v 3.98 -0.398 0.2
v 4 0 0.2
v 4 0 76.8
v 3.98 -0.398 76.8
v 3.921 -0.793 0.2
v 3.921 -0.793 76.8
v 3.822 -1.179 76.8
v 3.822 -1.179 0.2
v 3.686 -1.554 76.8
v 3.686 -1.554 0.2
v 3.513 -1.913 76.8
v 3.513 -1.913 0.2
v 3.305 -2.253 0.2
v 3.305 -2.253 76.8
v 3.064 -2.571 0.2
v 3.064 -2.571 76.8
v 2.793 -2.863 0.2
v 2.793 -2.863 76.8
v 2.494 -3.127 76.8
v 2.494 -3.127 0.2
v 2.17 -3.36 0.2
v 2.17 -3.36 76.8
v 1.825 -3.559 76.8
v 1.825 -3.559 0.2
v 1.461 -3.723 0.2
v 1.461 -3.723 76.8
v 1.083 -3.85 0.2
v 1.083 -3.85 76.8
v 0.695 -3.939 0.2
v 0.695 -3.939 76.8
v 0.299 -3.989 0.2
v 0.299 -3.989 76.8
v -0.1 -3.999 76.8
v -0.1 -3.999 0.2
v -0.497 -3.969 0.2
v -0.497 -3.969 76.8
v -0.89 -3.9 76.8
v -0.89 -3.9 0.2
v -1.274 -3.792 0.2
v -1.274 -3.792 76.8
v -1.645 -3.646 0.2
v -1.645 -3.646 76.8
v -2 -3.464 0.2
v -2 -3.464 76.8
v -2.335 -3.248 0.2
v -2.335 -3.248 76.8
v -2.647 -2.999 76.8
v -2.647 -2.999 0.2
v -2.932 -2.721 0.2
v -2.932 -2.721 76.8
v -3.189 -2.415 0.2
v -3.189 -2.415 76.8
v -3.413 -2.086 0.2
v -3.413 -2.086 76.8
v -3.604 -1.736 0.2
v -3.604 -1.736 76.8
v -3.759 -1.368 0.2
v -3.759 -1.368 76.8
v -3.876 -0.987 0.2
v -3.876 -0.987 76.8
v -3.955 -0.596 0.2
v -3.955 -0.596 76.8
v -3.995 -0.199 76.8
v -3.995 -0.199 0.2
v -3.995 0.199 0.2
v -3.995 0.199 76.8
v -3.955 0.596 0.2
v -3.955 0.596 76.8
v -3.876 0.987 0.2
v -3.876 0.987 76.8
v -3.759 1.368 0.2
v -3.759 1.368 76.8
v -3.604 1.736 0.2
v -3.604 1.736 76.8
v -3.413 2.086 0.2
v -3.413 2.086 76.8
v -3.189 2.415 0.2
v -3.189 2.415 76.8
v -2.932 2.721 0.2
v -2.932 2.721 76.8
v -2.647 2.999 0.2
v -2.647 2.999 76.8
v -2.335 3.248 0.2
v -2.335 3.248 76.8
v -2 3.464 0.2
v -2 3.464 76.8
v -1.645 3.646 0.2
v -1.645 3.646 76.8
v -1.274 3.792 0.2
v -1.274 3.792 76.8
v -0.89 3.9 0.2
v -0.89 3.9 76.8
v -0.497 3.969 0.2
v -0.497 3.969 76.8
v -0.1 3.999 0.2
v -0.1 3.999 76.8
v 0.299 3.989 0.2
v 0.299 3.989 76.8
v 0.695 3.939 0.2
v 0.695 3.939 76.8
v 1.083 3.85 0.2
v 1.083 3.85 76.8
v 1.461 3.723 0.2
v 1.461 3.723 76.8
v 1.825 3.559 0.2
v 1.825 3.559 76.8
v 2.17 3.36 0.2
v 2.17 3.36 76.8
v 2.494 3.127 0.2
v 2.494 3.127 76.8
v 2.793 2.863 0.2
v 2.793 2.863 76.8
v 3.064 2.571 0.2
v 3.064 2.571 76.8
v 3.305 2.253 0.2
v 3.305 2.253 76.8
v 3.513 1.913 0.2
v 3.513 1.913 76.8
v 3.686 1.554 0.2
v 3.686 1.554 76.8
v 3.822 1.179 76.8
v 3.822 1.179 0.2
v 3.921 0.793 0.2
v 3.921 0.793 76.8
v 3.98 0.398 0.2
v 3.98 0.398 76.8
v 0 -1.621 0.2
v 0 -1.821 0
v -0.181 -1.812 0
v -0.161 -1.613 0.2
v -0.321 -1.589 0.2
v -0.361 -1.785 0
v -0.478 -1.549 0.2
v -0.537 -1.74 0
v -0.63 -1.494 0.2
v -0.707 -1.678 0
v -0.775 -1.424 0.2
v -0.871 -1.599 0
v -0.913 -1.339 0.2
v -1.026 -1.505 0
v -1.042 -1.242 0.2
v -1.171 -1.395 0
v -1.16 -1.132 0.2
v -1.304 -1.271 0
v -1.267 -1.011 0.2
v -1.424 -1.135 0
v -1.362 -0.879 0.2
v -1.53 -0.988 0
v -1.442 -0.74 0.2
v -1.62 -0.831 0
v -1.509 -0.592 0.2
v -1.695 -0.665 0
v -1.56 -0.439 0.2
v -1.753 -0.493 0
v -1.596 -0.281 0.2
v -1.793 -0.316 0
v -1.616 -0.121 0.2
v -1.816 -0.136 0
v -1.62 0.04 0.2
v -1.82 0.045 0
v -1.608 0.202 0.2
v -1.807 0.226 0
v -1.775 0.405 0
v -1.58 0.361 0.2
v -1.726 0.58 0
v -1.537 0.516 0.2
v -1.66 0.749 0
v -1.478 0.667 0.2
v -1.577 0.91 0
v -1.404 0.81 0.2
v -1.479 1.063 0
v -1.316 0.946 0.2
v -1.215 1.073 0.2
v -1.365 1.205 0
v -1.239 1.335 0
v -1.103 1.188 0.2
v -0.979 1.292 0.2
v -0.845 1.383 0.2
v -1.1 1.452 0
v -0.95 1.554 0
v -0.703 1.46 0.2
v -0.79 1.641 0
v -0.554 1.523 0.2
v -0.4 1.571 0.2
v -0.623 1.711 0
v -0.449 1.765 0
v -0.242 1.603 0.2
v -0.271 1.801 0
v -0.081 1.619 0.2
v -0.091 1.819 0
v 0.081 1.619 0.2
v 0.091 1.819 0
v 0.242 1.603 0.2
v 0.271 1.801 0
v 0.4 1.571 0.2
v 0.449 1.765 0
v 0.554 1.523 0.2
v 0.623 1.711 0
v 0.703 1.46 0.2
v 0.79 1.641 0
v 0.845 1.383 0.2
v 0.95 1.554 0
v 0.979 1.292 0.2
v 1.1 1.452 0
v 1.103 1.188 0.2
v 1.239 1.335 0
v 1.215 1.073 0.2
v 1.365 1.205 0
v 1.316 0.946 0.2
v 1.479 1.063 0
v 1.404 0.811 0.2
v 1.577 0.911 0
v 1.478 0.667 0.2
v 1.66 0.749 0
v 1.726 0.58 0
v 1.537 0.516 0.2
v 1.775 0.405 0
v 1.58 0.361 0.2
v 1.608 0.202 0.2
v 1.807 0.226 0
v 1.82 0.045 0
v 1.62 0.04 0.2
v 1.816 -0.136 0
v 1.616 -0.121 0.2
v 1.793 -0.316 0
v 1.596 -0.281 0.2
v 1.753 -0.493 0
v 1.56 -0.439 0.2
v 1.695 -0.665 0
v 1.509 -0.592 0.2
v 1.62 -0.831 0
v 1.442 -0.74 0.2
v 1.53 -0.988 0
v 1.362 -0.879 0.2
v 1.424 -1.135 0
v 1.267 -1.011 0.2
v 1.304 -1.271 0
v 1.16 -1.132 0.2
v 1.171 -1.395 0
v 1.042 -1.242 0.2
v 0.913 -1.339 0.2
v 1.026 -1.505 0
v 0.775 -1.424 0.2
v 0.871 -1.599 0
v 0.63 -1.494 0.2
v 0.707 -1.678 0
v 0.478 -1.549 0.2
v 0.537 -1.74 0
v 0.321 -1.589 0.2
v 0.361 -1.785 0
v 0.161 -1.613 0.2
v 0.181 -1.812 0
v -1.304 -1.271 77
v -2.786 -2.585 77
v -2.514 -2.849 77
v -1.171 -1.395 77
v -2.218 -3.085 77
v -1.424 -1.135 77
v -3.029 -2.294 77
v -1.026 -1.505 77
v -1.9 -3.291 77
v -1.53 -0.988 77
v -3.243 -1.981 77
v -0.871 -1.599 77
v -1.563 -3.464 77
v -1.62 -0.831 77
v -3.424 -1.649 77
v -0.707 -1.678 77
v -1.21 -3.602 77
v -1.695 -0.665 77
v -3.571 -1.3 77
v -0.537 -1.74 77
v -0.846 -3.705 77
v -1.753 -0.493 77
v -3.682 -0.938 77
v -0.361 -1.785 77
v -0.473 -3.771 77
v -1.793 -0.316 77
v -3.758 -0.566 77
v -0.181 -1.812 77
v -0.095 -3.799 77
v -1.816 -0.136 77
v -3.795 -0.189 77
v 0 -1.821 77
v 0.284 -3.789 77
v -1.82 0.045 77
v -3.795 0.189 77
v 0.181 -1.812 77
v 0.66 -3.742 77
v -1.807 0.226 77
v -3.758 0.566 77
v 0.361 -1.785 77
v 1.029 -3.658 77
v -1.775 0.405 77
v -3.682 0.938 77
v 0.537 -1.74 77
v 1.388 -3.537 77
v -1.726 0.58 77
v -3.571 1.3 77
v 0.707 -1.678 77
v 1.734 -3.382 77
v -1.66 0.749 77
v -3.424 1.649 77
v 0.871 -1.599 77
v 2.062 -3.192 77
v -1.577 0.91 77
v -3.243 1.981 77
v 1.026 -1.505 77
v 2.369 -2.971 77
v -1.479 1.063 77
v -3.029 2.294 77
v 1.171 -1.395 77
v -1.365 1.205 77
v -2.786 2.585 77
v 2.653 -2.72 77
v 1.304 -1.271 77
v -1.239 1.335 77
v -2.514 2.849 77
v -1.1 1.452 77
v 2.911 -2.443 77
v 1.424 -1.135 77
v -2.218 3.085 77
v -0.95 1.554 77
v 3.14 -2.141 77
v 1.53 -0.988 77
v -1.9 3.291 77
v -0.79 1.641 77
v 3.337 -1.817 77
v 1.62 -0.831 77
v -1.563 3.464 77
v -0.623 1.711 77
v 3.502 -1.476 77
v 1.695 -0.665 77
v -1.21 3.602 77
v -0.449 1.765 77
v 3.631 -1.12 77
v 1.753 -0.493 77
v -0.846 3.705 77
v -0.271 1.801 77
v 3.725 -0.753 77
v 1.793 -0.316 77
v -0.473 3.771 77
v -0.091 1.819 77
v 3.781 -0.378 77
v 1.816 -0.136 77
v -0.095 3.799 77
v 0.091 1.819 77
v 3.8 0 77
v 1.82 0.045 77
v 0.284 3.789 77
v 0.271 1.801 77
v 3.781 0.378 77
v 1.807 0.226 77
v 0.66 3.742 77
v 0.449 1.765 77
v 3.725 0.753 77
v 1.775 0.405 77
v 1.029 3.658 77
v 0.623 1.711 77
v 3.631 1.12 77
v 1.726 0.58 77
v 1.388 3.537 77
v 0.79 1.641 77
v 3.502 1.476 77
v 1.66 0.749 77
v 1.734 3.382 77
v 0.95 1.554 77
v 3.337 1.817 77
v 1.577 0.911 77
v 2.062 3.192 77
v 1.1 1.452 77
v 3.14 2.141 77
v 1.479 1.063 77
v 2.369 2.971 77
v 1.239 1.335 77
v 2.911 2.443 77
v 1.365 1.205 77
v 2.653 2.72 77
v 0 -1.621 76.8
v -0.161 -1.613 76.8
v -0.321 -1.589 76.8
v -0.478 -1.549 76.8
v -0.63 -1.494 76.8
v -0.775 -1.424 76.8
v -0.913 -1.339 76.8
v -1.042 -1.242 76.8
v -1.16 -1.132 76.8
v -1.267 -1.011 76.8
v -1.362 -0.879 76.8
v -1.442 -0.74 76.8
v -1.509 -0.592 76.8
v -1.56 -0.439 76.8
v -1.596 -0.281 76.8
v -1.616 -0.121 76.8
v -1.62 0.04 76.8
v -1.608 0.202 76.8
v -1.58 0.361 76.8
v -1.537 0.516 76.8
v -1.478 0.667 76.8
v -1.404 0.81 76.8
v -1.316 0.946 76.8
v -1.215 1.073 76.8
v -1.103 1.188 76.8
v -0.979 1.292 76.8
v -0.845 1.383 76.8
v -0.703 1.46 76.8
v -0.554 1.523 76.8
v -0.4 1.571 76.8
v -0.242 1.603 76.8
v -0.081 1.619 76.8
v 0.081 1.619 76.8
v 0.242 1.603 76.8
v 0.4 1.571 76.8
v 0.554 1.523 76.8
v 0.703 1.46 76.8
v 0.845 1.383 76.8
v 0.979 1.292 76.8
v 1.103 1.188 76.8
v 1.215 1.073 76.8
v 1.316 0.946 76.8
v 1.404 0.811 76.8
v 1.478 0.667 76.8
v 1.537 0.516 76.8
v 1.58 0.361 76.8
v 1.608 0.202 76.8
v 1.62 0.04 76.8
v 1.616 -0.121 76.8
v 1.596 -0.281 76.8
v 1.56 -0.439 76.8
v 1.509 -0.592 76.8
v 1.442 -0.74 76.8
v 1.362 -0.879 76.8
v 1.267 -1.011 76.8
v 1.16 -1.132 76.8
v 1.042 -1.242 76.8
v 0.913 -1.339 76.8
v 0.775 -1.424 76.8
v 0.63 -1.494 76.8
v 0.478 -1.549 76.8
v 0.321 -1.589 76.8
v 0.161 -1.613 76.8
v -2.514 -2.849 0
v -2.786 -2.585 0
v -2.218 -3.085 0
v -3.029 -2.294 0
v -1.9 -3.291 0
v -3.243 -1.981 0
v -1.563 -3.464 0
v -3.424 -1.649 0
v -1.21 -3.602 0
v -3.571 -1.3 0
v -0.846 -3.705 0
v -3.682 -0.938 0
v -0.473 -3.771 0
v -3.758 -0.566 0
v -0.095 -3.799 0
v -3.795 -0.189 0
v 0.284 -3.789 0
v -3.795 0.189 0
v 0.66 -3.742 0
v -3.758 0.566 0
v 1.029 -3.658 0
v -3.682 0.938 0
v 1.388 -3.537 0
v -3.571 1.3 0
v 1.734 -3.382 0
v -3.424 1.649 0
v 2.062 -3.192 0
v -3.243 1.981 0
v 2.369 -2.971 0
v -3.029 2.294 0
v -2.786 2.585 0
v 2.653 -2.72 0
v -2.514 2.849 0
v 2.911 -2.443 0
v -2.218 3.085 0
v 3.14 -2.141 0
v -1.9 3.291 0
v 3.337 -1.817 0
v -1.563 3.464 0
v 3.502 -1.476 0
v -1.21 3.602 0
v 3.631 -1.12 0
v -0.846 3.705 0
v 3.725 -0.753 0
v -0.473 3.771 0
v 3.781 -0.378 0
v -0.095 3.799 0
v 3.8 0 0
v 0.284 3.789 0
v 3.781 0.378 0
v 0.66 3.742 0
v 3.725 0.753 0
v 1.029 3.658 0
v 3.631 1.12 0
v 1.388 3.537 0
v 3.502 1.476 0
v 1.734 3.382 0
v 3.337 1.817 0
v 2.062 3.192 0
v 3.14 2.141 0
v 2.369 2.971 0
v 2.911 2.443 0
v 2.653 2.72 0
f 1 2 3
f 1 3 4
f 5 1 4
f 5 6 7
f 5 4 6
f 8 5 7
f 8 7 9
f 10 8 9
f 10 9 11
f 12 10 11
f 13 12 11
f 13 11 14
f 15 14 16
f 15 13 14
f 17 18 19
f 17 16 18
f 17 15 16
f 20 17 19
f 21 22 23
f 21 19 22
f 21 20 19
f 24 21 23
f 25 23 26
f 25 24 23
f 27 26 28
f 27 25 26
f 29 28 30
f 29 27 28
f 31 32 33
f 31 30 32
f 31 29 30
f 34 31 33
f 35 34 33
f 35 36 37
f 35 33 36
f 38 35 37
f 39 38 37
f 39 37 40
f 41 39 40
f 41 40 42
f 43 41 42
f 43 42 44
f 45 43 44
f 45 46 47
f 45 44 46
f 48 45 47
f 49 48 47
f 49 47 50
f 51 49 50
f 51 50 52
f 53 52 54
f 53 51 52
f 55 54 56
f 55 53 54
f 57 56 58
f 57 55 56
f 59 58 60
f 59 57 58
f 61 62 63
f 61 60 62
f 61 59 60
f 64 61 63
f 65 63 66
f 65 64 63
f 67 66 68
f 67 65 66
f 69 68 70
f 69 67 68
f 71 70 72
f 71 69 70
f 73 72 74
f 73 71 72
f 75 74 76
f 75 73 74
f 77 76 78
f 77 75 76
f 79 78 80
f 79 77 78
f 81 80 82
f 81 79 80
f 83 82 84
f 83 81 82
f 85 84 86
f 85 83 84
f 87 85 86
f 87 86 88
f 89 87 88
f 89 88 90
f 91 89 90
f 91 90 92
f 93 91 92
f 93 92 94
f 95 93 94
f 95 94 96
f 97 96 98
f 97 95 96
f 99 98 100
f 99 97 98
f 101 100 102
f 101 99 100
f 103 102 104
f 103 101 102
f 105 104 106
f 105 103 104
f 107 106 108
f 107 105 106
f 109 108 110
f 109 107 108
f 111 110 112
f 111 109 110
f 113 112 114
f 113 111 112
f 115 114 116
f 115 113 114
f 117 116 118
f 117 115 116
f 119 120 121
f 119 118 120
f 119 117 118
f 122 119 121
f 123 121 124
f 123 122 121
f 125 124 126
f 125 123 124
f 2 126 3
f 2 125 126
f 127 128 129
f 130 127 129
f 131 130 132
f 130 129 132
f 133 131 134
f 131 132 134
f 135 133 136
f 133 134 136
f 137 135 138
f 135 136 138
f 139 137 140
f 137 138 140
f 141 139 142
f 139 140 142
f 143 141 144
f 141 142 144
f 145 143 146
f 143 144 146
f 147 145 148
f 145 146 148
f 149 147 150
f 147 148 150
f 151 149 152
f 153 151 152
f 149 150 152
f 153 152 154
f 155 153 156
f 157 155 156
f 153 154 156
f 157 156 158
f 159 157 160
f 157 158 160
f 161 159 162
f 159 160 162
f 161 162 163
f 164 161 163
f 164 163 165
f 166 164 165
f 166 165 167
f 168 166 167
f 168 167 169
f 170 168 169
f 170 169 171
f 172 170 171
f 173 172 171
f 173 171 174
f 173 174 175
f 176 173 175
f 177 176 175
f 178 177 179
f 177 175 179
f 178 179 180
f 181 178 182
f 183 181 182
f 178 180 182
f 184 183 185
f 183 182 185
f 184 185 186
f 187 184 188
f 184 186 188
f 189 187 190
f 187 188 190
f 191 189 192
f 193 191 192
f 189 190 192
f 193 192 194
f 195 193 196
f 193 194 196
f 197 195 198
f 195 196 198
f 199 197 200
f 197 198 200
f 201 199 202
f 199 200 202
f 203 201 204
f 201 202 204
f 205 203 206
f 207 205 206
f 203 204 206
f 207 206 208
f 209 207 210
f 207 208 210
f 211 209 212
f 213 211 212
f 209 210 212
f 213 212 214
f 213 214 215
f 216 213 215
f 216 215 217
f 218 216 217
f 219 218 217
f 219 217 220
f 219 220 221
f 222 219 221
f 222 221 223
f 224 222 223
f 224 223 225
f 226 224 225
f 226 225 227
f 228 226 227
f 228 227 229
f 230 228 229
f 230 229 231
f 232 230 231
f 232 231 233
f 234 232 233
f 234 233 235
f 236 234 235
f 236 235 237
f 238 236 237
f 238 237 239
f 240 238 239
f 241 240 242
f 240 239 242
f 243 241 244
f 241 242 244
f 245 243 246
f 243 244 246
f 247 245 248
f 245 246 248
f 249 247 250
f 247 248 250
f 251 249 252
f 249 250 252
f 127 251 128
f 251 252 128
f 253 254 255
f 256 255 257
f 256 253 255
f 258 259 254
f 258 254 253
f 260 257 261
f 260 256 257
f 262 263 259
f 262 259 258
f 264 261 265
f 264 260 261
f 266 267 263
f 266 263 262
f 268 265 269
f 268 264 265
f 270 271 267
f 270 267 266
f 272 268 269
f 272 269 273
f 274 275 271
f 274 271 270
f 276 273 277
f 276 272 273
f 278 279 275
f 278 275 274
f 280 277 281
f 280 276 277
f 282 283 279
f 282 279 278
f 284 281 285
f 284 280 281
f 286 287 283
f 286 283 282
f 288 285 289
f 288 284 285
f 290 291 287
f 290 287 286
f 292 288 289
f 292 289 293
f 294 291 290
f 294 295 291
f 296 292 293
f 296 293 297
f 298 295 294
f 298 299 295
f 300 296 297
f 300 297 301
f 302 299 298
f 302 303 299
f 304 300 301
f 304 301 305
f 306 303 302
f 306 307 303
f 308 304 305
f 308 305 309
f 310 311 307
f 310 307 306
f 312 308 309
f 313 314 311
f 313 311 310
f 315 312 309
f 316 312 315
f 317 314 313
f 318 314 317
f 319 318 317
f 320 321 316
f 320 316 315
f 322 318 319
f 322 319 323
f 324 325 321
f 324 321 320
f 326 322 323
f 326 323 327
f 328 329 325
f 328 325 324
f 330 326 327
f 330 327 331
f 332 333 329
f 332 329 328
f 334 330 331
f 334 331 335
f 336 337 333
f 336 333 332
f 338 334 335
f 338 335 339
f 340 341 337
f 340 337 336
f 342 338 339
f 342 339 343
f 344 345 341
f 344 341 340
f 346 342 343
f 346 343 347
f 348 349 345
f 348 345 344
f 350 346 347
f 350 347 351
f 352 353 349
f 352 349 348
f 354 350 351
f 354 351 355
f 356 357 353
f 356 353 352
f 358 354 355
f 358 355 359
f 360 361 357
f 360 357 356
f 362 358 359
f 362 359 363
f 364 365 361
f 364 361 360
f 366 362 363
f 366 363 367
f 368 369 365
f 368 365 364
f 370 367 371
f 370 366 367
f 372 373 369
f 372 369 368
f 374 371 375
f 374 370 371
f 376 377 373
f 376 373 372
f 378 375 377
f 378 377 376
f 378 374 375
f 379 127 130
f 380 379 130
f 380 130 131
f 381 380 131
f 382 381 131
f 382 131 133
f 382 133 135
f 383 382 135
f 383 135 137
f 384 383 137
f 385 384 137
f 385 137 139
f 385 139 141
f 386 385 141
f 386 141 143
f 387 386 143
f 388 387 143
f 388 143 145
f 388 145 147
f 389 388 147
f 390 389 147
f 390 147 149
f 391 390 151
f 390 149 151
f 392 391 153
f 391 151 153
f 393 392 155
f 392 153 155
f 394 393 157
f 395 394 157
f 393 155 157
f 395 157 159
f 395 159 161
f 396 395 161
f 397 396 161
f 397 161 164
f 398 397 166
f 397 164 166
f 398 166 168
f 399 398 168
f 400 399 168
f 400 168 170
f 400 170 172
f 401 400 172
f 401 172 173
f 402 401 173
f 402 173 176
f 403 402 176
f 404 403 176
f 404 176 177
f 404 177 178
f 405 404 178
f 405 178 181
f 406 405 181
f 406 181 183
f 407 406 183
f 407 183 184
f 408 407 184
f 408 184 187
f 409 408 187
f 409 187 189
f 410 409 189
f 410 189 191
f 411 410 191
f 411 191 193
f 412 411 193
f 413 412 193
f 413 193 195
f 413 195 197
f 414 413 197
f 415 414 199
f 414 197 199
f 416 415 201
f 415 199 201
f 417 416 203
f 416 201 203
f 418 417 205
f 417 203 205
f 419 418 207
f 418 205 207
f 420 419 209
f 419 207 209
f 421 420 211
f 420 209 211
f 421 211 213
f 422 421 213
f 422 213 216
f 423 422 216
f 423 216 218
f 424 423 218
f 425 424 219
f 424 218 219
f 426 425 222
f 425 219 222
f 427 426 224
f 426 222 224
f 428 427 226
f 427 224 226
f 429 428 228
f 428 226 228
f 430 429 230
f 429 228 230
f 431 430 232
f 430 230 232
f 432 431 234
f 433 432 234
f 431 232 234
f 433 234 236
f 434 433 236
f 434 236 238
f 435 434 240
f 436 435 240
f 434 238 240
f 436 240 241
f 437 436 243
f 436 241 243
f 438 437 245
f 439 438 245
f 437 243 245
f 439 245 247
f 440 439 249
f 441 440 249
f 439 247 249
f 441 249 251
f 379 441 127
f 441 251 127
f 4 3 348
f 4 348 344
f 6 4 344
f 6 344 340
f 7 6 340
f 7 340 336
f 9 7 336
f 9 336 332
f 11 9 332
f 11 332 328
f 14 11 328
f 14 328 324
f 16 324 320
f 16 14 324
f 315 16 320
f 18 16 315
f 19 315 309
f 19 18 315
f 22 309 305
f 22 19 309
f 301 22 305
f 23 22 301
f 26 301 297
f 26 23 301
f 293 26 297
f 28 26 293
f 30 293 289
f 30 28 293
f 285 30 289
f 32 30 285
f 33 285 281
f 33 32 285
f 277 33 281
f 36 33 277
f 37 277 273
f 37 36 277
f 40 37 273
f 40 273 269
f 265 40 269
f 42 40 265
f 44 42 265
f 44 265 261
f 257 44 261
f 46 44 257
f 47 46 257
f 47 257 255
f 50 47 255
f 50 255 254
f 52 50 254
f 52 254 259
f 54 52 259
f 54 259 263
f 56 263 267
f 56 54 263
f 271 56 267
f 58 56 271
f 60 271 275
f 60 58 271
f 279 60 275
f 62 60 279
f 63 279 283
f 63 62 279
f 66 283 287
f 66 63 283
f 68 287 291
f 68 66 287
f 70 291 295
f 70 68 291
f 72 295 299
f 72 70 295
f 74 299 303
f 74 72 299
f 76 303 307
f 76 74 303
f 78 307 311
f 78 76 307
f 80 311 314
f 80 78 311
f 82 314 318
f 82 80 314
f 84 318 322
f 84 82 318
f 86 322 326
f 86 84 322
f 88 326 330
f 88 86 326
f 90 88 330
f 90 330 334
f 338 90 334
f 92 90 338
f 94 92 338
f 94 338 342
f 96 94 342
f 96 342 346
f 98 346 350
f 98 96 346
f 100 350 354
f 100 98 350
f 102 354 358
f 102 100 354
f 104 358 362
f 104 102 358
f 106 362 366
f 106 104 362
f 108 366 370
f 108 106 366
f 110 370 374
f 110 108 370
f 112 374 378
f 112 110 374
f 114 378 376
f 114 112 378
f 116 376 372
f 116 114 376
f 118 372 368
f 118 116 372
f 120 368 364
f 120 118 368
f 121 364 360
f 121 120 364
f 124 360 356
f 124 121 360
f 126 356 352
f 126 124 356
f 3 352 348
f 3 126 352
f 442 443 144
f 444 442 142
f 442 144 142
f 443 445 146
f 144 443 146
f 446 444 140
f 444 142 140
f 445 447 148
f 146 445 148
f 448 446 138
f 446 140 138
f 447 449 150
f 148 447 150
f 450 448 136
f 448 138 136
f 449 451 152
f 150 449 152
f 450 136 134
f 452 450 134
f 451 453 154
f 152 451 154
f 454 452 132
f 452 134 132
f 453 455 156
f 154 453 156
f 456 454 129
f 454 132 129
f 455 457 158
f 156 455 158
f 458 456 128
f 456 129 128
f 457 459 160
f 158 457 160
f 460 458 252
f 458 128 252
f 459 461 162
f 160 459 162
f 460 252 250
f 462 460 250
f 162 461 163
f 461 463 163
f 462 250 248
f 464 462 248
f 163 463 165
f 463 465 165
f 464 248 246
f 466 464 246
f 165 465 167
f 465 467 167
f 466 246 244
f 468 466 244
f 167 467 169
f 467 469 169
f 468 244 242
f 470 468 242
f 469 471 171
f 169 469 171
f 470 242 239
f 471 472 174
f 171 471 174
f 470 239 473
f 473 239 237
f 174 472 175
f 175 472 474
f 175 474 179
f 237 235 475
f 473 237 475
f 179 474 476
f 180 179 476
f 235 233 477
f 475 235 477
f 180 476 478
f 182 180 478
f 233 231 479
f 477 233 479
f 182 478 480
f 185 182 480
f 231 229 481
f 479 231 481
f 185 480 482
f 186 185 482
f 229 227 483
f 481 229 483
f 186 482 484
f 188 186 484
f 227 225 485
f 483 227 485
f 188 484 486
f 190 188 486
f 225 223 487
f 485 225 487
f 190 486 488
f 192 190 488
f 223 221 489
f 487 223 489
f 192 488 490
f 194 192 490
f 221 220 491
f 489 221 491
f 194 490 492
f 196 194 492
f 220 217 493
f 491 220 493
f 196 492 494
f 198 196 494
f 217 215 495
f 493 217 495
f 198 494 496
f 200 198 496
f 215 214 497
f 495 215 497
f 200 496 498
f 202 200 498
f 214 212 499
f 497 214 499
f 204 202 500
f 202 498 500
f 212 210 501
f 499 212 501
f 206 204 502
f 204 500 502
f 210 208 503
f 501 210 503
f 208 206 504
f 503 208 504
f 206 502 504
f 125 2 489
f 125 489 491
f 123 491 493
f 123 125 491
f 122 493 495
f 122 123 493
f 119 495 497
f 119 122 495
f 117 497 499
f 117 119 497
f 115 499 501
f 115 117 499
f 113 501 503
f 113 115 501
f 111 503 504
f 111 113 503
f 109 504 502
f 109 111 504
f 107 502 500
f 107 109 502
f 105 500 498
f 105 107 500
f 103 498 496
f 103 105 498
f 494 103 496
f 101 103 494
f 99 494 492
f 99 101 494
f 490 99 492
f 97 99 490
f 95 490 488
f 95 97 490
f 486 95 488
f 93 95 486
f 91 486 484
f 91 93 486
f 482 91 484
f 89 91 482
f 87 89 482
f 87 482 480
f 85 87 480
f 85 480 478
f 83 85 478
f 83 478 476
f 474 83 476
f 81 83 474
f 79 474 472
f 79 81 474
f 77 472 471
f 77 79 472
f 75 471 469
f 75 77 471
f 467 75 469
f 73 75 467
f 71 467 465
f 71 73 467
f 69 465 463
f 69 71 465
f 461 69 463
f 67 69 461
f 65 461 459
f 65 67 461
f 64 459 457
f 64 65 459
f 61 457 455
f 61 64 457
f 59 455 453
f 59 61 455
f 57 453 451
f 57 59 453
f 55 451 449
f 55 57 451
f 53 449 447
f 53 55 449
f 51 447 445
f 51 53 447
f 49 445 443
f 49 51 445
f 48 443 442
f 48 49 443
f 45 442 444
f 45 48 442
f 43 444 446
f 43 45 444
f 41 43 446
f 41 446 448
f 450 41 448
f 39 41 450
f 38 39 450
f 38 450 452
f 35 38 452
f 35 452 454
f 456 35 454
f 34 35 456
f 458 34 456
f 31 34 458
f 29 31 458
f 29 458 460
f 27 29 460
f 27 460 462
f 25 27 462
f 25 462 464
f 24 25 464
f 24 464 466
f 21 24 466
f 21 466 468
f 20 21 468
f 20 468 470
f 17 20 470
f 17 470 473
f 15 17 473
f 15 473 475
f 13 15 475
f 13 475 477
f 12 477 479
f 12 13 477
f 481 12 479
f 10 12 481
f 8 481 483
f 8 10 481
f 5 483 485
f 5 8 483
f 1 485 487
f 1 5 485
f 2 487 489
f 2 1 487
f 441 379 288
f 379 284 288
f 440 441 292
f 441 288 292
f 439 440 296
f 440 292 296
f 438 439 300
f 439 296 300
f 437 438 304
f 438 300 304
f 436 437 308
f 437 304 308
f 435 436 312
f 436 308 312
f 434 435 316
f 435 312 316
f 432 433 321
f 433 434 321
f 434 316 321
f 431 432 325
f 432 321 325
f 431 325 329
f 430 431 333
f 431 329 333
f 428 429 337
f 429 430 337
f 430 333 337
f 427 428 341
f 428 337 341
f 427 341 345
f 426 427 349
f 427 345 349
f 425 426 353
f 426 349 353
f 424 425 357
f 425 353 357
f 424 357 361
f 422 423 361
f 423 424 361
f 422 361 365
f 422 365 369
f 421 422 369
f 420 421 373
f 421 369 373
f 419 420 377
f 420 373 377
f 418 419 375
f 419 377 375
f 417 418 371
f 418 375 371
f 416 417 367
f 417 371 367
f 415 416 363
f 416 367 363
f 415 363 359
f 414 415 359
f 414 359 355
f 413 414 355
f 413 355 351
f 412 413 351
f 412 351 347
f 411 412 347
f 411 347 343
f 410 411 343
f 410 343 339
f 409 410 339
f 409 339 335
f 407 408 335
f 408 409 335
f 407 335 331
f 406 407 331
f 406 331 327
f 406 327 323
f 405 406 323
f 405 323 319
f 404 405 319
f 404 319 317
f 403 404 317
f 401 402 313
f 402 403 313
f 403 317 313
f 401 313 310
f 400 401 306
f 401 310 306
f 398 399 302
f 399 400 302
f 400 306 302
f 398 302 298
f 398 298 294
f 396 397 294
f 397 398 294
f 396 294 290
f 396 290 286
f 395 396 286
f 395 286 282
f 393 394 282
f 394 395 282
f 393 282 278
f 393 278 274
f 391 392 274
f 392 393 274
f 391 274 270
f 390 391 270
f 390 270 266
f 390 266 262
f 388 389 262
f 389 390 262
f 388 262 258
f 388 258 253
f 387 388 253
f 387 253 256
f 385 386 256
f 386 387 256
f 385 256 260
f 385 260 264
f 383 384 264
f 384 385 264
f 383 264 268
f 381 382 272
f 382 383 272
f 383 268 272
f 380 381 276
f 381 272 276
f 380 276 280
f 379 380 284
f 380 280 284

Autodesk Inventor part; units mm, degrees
ref_plane "YZ Plane" through (0, 0, 0) normal (1, 0, 0) x (0, 1, 0)
ref_plane "XZ Plane" through (0, 0, 0) normal (0, 1, 0) x (-1, 0, 0)
ref_plane "XY Plane" through (0, 0, 0) normal (0, 0, 1) x (1, 0, 0)
sketch "スケッチ1" plane through (0, 0, 0) normal (0, 0, 1) x (1, 0, 0)
  circle A0 centre (0, 0) radius 4
  dimension "d13" = 8
extrude "押し出し1" add sketch "スケッチ1" along normal blind 77
sketch "スケッチ2" plane through (0, 0, 77) normal (0, 0, 1) x (1, 0, 0)
  point P0 (0, 0)
  point P1 (0, 0)
hole "穴1" at (0, 0, 77) direction (0, 0, -1) diameter 3.242 end through all thread size "M4x0.7" class "6H" standard "ANSI Metric M Profile"
chamfer "面取り1" distance 0.2 angle 45 4 edges at (0, 1.621, 77) (0, 1.621, 0) (-4, 0, 77) (-4, 0, 0)
properties part number "ARF-4_2" material "鋼、炭素鋼"
